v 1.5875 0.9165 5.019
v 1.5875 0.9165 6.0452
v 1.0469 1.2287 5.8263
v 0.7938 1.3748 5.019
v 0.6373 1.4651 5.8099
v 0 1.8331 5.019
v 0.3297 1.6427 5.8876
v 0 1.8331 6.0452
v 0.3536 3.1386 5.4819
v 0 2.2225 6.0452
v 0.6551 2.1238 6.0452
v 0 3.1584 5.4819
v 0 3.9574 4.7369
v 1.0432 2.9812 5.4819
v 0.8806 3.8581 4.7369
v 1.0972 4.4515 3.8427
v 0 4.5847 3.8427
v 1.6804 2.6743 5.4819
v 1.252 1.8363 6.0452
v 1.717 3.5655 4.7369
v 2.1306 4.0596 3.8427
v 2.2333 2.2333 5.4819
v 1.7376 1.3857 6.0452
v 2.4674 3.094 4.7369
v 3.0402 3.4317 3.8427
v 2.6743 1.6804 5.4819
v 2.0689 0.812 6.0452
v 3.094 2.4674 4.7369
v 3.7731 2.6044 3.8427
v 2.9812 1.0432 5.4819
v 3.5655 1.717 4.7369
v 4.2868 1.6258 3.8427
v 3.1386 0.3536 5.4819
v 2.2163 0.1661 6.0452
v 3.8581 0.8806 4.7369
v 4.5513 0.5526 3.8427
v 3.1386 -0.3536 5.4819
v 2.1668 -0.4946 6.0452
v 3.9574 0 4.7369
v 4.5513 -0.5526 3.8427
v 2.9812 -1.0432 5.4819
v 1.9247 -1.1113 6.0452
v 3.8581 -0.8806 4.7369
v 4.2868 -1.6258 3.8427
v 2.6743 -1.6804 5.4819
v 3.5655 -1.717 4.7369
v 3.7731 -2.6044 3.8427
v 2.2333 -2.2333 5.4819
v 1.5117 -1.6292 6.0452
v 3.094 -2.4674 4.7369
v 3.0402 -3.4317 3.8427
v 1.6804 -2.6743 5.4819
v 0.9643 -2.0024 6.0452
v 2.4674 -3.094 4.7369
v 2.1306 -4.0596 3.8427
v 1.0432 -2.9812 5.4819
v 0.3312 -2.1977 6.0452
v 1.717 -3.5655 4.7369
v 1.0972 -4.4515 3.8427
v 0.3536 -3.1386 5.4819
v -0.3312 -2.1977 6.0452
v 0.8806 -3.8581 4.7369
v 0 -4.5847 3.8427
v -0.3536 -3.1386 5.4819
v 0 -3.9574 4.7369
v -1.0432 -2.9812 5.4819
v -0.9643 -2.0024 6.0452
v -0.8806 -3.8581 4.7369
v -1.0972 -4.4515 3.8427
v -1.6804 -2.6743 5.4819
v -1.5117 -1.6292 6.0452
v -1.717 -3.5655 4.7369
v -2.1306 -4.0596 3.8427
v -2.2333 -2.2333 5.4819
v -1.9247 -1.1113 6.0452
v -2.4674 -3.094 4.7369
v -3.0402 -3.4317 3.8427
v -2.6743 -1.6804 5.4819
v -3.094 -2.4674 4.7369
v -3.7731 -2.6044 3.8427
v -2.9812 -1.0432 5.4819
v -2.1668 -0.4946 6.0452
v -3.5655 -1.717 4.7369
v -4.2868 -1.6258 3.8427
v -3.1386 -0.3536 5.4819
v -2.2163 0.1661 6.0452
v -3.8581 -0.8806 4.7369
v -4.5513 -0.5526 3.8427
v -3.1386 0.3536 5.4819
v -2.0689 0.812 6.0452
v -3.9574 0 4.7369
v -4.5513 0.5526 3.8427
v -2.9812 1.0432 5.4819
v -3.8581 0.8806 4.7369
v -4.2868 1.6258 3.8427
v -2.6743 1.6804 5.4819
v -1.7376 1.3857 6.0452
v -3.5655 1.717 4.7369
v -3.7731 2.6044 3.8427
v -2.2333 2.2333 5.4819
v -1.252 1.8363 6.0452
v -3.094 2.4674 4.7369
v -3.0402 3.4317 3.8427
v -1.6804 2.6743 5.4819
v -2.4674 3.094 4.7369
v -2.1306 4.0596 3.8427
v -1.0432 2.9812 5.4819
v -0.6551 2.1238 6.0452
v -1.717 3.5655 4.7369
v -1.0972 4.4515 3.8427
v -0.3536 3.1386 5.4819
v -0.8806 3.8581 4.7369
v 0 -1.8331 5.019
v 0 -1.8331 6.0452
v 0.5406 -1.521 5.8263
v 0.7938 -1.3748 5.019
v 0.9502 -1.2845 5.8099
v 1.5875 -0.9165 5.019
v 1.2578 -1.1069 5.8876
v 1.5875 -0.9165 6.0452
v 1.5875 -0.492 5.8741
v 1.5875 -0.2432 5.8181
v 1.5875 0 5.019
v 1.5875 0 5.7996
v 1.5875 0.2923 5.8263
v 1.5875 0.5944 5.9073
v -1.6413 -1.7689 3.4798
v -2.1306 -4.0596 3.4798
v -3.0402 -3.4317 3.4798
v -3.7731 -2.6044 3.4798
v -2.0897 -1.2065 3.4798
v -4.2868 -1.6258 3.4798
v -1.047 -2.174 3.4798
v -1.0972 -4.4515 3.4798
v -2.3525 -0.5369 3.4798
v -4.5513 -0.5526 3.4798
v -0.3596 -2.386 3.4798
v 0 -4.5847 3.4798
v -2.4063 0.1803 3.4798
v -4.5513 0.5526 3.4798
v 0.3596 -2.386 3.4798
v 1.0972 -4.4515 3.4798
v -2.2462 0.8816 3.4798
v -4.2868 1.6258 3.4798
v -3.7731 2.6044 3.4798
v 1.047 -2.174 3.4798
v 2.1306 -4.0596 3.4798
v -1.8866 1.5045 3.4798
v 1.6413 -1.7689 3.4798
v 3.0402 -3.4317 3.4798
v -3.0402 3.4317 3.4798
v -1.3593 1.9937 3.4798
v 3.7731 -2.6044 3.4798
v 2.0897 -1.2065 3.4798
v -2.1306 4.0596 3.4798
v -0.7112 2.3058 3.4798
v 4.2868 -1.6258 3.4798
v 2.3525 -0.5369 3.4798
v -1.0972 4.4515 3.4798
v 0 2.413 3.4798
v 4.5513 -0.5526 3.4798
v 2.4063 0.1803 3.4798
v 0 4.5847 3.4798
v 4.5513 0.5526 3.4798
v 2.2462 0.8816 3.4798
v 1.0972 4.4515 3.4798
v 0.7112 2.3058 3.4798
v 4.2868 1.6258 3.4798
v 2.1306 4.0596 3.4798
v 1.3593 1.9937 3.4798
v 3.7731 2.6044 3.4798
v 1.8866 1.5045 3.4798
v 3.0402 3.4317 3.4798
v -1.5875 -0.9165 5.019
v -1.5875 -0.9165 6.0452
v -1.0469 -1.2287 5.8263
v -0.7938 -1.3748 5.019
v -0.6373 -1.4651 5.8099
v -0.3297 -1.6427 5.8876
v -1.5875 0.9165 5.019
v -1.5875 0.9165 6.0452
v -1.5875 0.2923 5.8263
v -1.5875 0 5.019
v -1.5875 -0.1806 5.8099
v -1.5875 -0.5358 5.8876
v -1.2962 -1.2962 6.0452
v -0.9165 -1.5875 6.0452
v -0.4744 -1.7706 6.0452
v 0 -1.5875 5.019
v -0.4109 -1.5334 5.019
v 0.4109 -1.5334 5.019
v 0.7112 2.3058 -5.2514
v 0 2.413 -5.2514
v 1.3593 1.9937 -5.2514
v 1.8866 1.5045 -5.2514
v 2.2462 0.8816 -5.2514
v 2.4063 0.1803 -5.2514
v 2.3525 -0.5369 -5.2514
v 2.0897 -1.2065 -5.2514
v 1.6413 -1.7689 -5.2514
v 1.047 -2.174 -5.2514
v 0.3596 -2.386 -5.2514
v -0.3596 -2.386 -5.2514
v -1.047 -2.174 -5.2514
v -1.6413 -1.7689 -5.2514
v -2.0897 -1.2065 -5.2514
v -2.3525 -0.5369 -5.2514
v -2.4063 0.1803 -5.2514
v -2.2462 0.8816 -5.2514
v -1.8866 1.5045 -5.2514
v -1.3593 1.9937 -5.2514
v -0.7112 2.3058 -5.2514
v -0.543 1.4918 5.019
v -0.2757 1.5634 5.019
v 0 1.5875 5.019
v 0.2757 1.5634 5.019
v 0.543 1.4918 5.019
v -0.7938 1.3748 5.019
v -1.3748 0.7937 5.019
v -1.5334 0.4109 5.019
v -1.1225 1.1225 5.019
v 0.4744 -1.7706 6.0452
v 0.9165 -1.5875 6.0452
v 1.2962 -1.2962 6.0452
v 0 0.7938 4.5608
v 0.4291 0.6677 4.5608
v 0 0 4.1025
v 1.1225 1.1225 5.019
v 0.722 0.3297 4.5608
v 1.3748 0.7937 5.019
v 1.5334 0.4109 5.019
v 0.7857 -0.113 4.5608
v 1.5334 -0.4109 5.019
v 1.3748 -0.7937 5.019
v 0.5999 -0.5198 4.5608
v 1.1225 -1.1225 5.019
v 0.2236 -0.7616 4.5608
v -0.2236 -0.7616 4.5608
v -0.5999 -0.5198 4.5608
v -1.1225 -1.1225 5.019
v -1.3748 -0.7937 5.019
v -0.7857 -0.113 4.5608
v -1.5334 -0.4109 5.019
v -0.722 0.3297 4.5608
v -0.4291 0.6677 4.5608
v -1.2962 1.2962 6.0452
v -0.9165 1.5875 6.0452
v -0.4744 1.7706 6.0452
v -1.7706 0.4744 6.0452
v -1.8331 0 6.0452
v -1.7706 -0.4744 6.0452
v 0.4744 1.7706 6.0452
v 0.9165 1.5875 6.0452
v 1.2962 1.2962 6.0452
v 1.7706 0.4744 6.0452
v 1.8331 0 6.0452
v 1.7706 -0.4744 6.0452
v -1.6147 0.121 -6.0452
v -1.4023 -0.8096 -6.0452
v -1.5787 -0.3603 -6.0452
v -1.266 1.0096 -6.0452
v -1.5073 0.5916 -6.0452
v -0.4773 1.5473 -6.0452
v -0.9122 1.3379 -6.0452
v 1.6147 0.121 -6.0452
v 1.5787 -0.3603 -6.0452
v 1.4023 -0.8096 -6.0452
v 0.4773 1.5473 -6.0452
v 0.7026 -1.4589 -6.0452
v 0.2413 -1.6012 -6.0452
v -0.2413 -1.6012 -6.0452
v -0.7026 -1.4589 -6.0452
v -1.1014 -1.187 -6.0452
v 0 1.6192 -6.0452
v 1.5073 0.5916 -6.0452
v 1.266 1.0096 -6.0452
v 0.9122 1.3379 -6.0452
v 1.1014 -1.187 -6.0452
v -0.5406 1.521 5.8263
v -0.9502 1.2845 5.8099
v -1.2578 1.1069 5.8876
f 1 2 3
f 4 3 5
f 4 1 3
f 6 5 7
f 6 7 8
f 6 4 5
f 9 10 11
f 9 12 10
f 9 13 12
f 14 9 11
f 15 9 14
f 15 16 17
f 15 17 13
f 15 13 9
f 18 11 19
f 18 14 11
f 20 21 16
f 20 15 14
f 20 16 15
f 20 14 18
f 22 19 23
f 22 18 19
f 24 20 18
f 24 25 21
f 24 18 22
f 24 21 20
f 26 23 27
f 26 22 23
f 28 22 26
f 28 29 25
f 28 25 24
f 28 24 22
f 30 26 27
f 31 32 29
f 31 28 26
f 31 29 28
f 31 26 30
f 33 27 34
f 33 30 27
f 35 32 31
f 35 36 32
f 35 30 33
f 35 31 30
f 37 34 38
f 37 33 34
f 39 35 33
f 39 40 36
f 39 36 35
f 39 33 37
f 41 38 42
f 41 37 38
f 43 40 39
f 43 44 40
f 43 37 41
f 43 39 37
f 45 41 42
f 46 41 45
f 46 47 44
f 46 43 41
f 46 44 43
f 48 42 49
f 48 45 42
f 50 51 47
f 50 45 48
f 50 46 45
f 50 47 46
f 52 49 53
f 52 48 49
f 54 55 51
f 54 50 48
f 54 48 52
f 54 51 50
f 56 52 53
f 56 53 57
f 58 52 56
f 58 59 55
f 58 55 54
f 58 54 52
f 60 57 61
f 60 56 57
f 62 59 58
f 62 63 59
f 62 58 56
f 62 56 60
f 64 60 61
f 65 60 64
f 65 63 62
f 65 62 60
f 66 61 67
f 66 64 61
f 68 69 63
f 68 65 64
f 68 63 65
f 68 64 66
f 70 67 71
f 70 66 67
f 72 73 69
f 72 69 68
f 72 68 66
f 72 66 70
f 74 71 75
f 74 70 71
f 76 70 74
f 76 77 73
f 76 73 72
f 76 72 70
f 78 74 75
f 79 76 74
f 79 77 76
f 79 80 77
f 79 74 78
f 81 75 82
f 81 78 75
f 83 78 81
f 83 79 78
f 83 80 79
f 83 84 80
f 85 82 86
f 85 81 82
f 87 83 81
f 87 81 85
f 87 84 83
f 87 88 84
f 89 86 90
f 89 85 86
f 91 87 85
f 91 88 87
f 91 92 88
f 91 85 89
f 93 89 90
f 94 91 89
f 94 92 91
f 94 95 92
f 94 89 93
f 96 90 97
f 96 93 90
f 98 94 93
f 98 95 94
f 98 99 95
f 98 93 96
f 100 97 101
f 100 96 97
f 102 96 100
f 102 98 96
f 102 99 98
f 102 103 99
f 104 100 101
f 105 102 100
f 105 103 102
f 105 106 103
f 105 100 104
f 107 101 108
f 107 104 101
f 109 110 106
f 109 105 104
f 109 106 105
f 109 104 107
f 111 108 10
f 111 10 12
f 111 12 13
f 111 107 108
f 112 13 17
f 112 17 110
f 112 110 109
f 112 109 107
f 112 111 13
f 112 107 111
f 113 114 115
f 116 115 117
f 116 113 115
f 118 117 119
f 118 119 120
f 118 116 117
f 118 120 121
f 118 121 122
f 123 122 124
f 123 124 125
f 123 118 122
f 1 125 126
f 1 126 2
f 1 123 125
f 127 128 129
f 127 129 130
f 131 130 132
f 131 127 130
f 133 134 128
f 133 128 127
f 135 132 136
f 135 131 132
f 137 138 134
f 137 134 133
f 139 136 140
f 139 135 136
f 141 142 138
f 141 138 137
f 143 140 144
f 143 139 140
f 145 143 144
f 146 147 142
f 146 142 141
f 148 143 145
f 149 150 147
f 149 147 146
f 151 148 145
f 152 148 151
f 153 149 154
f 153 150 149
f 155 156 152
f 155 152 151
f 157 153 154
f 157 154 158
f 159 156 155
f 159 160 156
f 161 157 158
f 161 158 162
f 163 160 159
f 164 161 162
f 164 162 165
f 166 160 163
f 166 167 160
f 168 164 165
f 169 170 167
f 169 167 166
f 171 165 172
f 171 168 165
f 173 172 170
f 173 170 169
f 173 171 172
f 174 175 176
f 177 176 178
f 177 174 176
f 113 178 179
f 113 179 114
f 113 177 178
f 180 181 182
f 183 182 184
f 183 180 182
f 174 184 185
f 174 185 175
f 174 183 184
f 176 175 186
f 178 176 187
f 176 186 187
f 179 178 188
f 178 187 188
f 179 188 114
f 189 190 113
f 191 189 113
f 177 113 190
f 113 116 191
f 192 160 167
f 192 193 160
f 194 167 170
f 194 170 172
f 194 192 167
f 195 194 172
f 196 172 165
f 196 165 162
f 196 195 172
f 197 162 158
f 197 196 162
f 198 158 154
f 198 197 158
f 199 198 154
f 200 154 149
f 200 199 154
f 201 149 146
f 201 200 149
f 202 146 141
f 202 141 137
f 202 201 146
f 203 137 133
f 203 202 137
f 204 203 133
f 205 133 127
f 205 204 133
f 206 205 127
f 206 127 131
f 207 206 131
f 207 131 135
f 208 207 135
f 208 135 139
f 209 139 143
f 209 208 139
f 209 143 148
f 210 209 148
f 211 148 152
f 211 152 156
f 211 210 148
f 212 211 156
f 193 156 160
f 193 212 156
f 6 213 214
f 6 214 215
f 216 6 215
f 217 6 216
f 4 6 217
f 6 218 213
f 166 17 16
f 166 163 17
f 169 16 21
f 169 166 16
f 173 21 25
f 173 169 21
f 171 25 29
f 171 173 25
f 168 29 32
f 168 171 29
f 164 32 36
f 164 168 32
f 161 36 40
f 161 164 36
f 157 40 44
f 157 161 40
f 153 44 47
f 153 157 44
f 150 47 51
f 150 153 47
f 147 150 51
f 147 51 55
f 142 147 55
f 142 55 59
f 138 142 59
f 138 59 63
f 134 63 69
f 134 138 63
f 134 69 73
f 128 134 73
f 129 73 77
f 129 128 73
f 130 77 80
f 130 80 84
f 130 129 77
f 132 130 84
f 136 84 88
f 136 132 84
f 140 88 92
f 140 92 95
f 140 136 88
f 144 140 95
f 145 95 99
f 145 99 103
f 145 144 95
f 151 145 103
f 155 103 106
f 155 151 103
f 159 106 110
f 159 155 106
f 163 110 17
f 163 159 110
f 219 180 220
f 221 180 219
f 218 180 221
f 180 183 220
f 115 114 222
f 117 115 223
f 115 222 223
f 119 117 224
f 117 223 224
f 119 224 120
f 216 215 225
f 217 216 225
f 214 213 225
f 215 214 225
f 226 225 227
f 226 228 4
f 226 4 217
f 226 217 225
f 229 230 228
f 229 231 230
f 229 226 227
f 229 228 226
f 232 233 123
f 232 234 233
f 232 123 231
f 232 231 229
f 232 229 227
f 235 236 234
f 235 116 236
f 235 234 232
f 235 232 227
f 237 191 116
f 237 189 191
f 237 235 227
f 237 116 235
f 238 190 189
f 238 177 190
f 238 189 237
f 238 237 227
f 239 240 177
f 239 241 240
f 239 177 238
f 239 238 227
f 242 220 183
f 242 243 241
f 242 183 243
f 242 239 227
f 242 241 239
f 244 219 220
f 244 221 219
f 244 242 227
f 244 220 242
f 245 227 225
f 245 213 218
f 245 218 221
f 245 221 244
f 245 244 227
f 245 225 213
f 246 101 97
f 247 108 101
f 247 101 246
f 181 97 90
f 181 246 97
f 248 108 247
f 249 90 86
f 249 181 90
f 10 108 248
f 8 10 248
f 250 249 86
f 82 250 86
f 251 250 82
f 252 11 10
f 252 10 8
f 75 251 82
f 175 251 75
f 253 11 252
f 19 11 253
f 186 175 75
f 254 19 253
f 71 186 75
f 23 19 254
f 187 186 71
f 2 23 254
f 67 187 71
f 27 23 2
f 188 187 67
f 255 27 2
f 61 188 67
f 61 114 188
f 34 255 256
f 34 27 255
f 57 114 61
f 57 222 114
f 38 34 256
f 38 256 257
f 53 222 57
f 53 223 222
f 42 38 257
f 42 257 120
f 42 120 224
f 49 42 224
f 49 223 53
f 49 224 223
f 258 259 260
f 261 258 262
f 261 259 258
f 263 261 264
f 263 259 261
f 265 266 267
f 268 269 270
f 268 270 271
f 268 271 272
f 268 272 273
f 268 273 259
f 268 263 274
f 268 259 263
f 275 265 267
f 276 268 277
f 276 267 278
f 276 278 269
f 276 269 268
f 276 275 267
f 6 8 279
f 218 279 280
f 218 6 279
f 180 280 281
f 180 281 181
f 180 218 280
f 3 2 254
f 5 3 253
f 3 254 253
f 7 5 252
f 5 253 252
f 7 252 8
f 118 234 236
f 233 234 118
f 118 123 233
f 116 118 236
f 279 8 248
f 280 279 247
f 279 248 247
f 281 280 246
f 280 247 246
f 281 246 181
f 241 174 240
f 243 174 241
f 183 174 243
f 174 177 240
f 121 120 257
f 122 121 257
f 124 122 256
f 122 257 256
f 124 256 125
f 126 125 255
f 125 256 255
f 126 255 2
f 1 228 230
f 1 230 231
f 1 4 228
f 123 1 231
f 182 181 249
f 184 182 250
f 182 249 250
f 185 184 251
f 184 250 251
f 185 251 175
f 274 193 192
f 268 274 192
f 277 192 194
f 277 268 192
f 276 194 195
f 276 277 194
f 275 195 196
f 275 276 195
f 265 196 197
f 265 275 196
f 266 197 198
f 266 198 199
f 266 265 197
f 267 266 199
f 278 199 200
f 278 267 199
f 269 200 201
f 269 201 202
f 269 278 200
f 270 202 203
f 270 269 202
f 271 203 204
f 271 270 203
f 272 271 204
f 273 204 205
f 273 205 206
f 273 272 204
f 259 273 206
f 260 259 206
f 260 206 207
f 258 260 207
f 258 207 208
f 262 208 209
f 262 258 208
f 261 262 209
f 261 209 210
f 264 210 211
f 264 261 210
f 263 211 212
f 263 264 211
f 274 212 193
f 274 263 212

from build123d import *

# Parameters (mm, degrees)
CUT_EXTRUDE1_START = 5.01904
CUT_EXTRUDE1_DEPTH = 2.02616
SKETCH4_R          = 1.833087105
CUT_EXTRUDE2_DEPTH = 1.02616
CUT_EXTRUDE2_DRAFT = -45


with BuildPart() as part:
    # Sketch2 → Revolve1 (revolve)
    with BuildSketch(Plane(origin=(0, 0, 0), x_dir=(0, 0, -1), z_dir=(1, 0, 0))):
        with BuildLine():
            Line((-6.0452, 1.5875), (-6.0452, 2.2225))
            ThreePointArc((-6.0452, 2.2225), (-5.130252118, 3.57733025), (-3.842657143, 4.5847))
            Line((-3.842657143, 4.5847), (-3.4798, 4.5847))
            Line((-3.4798, 4.5847), (-3.4798, 2.413))
            Line((-3.4798, 2.413), (5.25145, 2.413))
            Line((5.25145, 2.413), (6.0452, 1.61925))
            Line((6.0452, 1.61925), (6.0452, 0))
            Line((6.0452, 0), (-4.102496448, 0))
            Line((-4.102496448, 0), (-5.01904, 1.5875))
            Line((-5.01904, 1.5875), (-6.0452, 1.5875))
        make_face()
    revolve(axis=Axis((0, 0, 6.0452), (0, 0, -1)))

    # Sketch3 → Cut-Extrude1 (cut, through all)
    with BuildSketch(Plane.XY.offset(CUT_EXTRUDE1_START)):
        Polygon((0, 1.833087105), (-1.5875, 0.916543552), (-1.5875, -0.916543552), (0, -1.833087105), (1.5875, -0.916543552), (1.5875, 0.916543552), align=None)
    extrude(amount=CUT_EXTRUDE1_DEPTH, mode=Mode.SUBTRACT)


with BuildPart() as cut_extrude2_tool:
    # Sketch4 → Cut-Extrude2 (with draft: the straight prism first)
    with BuildSketch(Plane.XY.offset(6.0452)):
        Circle(SKETCH4_R)
    extrude(amount=-CUT_EXTRUDE2_DEPTH)
    # Cut-Extrude2: the draft: its side faces are tilted about the plane it starts from
    cut_extrude2_sides = [cut_extrude2_tool.faces().sort_by_distance(p)[0] for p in [
        (-1.833087105, 0, 5.53212),
    ]]
    draft(cut_extrude2_sides, Plane.XY.offset(6.0452), CUT_EXTRUDE2_DRAFT)


with BuildPart() as part_1:
    add(part.part)

    # Cut-Extrude2: cut by cut_extrude2_tool
    add(cut_extrude2_tool.part, mode=Mode.SUBTRACT)


solid = part_1.part
